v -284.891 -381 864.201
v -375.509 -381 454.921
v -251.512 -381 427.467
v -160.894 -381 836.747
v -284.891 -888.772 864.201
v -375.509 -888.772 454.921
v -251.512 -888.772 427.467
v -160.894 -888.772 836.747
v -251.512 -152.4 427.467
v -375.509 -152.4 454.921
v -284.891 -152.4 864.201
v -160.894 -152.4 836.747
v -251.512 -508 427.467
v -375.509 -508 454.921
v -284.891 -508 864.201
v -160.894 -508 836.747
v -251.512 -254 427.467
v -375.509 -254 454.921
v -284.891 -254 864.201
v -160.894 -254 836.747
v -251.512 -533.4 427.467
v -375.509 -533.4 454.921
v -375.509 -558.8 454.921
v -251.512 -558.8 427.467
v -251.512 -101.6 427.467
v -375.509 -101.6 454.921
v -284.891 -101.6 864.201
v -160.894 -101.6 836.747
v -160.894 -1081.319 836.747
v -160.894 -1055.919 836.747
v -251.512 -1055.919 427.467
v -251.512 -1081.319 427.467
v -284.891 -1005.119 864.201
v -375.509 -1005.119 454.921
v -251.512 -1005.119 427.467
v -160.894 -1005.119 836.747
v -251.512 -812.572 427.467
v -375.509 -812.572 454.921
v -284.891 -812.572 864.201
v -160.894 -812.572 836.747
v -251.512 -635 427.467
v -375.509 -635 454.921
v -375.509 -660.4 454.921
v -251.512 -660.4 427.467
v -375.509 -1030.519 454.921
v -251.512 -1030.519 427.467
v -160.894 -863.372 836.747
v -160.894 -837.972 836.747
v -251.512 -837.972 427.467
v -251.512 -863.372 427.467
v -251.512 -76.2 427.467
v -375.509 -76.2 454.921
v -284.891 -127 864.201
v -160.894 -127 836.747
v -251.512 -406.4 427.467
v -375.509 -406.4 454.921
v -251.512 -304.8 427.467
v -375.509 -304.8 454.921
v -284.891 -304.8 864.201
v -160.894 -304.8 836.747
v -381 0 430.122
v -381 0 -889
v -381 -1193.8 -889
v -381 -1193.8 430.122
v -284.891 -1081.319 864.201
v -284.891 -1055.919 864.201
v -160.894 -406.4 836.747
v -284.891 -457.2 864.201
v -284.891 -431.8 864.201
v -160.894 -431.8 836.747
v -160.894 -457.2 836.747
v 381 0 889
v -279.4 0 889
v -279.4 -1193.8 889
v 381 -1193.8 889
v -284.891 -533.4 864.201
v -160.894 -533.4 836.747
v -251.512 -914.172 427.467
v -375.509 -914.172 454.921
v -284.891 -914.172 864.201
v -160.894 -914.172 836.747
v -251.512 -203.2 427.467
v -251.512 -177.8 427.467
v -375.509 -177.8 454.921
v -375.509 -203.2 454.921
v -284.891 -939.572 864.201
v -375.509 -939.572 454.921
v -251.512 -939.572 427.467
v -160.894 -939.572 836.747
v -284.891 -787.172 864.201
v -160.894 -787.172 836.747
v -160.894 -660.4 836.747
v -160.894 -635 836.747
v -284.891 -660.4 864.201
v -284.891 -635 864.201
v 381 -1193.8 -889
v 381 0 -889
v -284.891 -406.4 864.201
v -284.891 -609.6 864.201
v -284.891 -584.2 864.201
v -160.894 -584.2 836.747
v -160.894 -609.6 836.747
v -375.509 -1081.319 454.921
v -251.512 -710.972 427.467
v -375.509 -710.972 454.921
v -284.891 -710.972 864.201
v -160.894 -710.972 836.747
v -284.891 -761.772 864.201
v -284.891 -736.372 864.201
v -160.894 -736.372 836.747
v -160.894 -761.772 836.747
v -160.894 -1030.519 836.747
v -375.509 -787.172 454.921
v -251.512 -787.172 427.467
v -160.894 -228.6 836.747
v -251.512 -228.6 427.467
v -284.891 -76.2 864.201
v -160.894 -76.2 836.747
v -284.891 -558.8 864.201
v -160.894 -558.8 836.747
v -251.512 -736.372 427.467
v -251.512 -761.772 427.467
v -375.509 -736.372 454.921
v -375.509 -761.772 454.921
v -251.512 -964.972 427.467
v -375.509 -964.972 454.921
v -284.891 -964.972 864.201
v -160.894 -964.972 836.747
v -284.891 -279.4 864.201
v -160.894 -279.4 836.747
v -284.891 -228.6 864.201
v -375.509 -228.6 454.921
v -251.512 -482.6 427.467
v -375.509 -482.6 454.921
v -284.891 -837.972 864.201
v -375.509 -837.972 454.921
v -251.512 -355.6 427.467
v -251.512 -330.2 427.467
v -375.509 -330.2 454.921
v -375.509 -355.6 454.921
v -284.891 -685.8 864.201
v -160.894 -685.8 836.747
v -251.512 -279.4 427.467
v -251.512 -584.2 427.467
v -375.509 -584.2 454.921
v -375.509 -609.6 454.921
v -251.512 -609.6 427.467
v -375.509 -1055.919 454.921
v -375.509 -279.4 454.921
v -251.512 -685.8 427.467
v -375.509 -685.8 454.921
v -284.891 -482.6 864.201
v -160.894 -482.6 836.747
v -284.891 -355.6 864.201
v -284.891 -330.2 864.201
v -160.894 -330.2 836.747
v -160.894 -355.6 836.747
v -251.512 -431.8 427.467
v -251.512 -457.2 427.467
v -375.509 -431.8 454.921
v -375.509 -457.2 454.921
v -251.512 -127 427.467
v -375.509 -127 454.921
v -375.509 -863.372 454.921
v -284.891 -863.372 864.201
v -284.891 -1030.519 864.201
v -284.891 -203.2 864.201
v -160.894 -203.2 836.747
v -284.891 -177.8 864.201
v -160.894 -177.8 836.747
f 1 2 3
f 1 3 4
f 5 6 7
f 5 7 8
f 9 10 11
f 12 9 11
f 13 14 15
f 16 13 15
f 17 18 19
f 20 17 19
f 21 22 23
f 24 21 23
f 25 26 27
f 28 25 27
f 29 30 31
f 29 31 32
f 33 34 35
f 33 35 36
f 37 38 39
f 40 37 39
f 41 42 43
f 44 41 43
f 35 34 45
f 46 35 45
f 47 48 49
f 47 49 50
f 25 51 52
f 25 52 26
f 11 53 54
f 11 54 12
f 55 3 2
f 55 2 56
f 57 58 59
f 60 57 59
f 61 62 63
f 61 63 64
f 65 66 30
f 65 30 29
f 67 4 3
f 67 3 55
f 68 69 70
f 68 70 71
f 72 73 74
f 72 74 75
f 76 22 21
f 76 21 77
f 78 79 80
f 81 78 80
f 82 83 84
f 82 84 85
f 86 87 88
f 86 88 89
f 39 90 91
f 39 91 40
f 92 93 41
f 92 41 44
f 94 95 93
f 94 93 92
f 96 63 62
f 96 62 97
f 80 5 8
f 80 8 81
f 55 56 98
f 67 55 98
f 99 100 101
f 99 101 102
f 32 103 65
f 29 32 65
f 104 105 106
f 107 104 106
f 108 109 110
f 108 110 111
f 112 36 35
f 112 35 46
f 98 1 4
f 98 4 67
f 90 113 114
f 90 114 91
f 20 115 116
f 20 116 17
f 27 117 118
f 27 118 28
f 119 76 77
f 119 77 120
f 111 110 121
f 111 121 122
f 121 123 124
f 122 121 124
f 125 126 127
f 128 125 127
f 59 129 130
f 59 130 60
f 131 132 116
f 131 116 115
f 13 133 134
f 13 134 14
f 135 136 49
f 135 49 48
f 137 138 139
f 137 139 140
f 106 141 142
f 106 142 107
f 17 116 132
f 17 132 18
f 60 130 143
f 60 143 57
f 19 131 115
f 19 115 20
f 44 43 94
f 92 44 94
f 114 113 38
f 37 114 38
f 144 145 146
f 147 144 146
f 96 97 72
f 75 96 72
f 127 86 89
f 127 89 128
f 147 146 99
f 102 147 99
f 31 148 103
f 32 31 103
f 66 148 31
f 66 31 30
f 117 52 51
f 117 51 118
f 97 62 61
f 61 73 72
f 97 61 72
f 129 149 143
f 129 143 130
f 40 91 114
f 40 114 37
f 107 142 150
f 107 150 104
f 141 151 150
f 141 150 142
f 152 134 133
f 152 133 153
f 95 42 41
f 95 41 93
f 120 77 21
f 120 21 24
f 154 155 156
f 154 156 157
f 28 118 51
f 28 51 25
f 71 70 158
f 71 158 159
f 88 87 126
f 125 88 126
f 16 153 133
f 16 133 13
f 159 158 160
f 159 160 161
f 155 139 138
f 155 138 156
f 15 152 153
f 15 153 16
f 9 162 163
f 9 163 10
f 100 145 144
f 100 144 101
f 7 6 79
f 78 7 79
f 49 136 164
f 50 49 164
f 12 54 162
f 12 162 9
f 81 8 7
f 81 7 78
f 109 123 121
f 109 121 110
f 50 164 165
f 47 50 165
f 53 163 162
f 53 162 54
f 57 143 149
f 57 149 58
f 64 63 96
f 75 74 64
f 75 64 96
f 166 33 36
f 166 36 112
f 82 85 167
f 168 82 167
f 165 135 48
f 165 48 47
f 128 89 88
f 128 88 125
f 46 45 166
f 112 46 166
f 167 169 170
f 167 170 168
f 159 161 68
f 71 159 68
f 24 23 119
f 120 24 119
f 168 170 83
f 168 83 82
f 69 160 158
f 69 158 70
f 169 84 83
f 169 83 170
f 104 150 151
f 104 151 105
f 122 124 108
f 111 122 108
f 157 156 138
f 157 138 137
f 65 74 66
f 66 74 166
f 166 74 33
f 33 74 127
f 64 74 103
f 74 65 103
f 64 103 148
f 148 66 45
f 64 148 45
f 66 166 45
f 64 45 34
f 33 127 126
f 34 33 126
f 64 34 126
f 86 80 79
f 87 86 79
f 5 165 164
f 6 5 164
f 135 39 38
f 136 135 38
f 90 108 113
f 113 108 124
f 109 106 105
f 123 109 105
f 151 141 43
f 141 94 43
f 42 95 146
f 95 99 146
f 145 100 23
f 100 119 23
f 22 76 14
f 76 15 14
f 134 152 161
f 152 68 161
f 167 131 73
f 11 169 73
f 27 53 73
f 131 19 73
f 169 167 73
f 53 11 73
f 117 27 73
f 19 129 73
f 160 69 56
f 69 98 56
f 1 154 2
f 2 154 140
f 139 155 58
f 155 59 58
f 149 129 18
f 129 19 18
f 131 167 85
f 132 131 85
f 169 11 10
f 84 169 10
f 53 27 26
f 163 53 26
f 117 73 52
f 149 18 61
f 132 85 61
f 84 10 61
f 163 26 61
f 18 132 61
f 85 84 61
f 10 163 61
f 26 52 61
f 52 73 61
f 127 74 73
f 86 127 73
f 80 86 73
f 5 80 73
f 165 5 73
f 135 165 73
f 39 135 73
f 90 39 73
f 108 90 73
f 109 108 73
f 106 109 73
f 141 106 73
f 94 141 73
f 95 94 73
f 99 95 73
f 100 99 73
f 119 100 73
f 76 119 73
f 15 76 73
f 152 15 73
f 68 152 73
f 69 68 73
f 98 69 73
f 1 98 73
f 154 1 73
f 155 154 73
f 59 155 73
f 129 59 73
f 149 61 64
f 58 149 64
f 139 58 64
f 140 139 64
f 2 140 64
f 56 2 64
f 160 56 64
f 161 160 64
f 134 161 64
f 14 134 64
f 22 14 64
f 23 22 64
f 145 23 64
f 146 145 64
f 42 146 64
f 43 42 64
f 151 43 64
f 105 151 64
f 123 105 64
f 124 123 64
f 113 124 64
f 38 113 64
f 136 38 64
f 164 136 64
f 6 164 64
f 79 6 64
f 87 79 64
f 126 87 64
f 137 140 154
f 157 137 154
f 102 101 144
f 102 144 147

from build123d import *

# Parameters (mm, degrees)
F0_W     = 762
F0_H     = 1778
F1_DEPTH = 1193.8
F3_DEPTH = 1524
F4_W     = 25.4
F4_H     = 419.191256
F4_W_2   = 25.17225
F5_DEPTH = 127


with BuildPart() as f1:
    # F0 (on Front) → F1 (new body)
    with BuildSketch(Plane.XZ):
        Rectangle(F0_W, F0_H)
    extrude(amount=F1_DEPTH)

    # F2 (on face) → F3 (cut)
    with BuildSketch(Plane(origin=(0, 0, 0), x_dir=(-1, 0, 0), z_dir=(0, 1, 0))):
        Polygon((381, 889), (279.4, 889), (381, 430.121779), align=None)
    extrude(amount=-F3_DEPTH, mode=Mode.SUBTRACT)

    # F4 (on face) → F5 (cut)
    with BuildSketch(Plane(origin=(-453.978061, 0, 100.515058), x_dir=(0, -1, 0), z_dir=(-0.976355, 0, 0.216174))):
        with Locations((88.9, 572.58471)):
            Rectangle(F4_W, F4_H)
        with Locations((139.7, 572.58471)):
            Rectangle(F4_W, F4_H)
        with Locations((190.5, 572.58471)):
            Rectangle(F4_W, F4_H)
        with Locations((241.3, 572.58471)):
            Rectangle(F4_W, F4_H)
        with Locations((292.1, 572.58471)):
            Rectangle(F4_W, F4_H)
        with Locations((342.9, 572.58471)):
            Rectangle(F4_W, F4_H)
        with Locations((393.7, 572.58471)):
            Rectangle(F4_W, F4_H)
        with Locations((444.5, 572.58471)):
            Rectangle(F4_W, F4_H)
        with Locations((495.3, 572.58471)):
            Rectangle(F4_W, F4_H)
        with Locations((546.1, 572.58471)):
            Rectangle(F4_W, F4_H)
        with Locations((596.9, 572.58471)):
            Rectangle(F4_W, F4_H)
        with Locations((647.7, 572.58471)):
            Rectangle(F4_W, F4_H)
        with Locations((698.386125, 572.58471)):
            Rectangle(F4_W_2, F4_H)
        with Locations((749.07225, 572.58471)):
            Rectangle(F4_W, F4_H)
        with Locations((799.87225, 572.58471)):
            Rectangle(F4_W, F4_H)
        with Locations((850.67225, 572.58471)):
            Rectangle(F4_W, F4_H)
        with Locations((901.47225, 572.58471)):
            Rectangle(F4_W, F4_H)
        with Locations((952.27225, 572.58471)):
            Rectangle(F4_W, F4_H)
        with Locations((1017.819324, 572.58471)):
            Rectangle(F4_W, F4_H)
        with Locations((1068.619324, 572.58471)):
            Rectangle(F4_W, F4_H)
    extrude(amount=-F5_DEPTH, mode=Mode.SUBTRACT)


solid = f1.part
